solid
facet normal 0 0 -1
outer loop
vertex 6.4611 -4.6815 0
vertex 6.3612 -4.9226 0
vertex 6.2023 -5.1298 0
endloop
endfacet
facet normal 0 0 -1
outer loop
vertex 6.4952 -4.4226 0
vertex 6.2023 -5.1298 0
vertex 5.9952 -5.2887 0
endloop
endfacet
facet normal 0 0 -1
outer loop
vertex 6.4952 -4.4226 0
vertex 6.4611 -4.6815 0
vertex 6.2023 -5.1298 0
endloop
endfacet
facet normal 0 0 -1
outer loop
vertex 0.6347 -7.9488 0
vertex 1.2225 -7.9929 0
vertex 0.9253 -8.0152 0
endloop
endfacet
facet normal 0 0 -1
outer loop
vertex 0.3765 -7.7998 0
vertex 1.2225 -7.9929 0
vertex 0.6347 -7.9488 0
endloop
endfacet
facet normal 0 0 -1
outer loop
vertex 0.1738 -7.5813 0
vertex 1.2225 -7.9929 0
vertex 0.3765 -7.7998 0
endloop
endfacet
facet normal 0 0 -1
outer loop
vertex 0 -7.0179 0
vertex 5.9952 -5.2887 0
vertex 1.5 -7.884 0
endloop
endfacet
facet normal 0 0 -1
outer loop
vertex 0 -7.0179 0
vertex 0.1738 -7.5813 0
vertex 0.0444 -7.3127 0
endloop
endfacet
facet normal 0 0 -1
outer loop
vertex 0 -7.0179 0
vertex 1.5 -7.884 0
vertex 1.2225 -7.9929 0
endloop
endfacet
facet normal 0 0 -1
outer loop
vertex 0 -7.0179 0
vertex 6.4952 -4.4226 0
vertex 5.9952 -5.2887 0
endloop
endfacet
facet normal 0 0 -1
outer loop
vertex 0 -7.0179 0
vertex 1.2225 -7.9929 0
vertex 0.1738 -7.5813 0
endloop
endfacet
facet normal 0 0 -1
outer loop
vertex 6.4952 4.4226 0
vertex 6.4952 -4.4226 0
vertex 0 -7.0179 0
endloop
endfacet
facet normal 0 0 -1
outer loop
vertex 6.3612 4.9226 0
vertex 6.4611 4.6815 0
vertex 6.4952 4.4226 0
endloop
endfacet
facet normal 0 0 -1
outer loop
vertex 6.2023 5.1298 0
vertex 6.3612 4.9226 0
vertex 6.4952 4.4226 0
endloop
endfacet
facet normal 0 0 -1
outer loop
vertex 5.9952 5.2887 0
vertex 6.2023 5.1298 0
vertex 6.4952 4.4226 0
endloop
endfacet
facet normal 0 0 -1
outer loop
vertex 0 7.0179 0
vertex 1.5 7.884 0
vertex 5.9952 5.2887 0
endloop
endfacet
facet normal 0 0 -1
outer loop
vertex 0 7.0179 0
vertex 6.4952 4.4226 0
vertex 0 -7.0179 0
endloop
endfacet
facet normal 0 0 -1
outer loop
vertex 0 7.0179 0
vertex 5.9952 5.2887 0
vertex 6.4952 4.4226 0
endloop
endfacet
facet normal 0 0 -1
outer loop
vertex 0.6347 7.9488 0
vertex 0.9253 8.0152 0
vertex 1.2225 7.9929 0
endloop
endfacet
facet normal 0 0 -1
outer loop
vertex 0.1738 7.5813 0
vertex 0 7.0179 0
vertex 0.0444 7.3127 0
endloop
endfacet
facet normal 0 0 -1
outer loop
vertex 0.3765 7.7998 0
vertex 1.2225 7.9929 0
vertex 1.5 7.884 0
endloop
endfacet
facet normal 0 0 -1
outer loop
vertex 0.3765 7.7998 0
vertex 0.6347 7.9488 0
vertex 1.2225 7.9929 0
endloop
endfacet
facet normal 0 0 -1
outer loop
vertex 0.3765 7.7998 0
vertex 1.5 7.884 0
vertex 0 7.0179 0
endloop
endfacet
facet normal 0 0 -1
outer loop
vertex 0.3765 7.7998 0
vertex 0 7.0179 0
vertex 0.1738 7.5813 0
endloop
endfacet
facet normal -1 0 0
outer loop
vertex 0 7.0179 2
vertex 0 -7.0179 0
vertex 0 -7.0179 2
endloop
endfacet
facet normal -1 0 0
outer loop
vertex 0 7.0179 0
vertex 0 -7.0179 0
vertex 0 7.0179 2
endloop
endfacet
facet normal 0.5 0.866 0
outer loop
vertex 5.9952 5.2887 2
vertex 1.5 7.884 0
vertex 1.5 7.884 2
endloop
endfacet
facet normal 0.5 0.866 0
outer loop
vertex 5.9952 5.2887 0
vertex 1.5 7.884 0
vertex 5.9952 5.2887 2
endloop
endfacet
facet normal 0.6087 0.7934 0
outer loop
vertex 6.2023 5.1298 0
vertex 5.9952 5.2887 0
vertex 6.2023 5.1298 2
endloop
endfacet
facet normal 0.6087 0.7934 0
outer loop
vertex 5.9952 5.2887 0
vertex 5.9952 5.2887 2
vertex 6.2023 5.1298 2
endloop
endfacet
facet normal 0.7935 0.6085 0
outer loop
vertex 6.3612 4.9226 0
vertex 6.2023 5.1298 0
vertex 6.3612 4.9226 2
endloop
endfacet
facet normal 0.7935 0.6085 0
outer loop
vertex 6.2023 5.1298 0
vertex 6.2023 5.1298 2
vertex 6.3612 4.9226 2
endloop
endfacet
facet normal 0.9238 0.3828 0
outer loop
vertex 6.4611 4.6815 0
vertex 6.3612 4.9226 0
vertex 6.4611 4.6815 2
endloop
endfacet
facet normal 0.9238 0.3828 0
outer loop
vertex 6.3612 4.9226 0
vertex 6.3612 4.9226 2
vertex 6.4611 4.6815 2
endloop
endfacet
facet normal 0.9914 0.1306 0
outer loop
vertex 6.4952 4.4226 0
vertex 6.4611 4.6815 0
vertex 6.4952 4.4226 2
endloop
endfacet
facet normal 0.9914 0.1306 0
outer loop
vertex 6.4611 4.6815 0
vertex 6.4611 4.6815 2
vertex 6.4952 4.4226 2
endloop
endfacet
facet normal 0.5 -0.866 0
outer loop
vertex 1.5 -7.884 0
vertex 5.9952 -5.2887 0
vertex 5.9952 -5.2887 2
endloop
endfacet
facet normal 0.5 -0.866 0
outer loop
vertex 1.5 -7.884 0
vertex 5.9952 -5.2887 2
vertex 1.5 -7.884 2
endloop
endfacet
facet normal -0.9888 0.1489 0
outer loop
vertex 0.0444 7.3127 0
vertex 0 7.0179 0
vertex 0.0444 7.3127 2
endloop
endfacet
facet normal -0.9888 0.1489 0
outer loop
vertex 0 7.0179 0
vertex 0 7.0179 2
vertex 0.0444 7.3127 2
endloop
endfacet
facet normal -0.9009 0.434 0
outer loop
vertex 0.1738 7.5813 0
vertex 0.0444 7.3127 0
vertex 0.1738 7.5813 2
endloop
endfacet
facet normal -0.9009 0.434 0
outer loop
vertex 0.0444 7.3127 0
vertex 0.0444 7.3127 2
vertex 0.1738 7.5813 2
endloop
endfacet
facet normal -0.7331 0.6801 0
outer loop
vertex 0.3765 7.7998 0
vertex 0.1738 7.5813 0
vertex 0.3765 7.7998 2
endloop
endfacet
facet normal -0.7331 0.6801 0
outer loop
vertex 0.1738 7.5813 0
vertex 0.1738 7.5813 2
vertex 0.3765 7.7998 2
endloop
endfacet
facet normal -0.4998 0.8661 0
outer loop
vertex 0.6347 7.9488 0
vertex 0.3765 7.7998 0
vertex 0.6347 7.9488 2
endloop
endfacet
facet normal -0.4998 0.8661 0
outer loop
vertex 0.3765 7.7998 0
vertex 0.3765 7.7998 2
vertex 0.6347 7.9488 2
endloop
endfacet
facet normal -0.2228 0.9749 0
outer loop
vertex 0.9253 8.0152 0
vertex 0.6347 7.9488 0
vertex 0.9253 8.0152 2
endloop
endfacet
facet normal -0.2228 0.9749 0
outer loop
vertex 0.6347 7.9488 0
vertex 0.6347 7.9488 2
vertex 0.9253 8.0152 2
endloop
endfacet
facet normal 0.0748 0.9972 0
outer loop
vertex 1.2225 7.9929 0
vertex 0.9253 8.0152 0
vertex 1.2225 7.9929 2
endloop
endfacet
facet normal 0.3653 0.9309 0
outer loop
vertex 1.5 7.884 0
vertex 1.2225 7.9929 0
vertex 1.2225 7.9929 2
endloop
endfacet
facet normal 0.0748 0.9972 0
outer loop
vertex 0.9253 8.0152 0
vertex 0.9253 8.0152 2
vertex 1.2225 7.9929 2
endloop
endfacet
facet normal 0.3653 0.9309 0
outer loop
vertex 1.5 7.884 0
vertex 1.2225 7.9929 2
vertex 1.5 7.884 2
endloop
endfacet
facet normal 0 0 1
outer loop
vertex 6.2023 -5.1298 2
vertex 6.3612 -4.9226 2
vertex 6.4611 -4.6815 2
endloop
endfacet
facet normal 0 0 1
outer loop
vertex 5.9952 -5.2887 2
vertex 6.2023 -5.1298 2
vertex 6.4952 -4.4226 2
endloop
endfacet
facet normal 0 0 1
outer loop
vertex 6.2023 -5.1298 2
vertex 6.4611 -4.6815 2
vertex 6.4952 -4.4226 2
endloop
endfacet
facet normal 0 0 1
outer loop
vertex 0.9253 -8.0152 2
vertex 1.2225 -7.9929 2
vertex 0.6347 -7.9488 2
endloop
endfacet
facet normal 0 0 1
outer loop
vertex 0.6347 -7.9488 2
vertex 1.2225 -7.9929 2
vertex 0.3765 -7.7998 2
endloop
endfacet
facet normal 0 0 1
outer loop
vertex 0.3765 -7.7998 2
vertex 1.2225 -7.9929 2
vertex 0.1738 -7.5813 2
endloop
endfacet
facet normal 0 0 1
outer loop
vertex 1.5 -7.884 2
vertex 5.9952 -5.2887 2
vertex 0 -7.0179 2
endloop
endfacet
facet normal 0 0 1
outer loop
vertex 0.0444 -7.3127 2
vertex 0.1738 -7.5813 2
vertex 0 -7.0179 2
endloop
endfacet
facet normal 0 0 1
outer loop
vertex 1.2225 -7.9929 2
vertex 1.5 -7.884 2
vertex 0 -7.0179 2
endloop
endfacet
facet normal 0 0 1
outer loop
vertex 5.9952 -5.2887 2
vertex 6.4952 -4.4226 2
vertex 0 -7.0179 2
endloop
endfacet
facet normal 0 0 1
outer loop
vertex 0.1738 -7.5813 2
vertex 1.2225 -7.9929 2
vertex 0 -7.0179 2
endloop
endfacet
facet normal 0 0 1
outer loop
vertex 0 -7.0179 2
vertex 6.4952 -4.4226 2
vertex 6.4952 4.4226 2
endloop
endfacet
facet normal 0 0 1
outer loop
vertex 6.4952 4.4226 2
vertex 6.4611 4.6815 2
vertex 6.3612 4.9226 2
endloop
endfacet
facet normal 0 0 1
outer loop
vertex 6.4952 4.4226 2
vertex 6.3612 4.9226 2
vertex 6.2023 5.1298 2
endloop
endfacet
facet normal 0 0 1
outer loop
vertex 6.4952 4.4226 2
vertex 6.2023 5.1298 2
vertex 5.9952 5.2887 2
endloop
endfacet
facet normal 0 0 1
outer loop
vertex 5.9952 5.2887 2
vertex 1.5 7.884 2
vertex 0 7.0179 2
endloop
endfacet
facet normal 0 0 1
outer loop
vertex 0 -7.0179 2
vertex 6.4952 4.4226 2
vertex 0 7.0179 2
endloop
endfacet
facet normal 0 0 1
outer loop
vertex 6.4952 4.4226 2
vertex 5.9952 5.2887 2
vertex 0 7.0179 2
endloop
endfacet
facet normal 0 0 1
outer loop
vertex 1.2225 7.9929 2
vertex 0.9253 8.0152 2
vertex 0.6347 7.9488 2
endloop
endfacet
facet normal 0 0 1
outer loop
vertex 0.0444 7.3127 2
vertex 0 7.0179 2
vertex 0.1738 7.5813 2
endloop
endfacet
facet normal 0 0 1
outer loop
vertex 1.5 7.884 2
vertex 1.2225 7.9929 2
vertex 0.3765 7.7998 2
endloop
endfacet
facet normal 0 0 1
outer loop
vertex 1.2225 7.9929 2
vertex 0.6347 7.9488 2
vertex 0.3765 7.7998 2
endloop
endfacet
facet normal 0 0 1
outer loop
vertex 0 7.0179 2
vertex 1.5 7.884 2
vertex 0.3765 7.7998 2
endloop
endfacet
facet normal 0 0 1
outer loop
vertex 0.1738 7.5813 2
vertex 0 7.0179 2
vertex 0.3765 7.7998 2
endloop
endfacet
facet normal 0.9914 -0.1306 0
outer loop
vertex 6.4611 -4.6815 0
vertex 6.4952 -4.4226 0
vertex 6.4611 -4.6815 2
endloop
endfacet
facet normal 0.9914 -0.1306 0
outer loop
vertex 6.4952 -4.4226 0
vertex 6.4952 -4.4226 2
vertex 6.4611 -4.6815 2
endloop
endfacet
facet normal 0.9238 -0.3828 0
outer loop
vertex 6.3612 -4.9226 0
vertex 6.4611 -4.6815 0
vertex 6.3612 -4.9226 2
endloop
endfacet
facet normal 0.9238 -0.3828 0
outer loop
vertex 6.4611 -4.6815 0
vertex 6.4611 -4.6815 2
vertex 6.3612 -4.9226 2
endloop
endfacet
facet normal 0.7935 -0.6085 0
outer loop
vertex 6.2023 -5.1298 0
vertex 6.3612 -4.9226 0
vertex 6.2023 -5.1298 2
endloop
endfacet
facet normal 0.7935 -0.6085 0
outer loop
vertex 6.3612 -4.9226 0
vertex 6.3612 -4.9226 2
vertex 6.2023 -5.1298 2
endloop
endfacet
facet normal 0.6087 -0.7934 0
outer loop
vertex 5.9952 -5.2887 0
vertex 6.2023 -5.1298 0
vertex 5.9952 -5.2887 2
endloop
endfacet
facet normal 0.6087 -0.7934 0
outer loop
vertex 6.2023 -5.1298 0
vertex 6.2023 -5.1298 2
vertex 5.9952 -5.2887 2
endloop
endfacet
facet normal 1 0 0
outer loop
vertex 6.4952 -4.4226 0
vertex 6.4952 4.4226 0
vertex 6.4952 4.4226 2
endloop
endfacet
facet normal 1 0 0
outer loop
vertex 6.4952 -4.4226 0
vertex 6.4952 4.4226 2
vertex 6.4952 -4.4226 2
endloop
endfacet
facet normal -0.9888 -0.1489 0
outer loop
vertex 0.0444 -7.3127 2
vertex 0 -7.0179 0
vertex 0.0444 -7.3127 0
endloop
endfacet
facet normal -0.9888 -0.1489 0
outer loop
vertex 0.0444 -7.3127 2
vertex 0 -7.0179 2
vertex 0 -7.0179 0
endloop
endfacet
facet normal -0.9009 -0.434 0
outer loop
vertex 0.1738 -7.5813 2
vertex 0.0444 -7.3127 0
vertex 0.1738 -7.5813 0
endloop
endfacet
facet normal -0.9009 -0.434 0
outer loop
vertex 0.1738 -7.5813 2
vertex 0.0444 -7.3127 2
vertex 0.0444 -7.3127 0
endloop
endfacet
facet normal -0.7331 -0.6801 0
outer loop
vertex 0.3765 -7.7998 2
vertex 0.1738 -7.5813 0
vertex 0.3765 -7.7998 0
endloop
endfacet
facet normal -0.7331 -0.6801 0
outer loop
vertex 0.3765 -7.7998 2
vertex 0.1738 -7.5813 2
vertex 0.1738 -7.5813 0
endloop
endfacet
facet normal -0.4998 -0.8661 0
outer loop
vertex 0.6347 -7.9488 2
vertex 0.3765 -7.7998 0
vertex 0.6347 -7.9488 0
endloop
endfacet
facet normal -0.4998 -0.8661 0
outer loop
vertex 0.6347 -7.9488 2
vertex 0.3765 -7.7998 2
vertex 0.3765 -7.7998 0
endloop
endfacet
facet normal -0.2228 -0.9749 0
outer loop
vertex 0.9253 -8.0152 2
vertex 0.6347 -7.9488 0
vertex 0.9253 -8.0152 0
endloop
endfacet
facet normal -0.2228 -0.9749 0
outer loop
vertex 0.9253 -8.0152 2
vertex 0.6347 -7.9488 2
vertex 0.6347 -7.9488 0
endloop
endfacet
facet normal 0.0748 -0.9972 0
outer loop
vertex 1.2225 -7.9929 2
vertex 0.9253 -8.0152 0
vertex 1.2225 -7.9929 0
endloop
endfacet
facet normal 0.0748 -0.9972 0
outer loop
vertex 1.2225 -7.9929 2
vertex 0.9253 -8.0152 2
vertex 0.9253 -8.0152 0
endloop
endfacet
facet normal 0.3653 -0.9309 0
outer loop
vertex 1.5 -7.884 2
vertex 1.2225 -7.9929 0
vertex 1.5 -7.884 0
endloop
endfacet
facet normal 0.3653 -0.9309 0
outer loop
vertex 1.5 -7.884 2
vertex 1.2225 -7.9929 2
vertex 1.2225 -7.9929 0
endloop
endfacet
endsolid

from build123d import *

# Parameters (mm, degrees)
Y_KSEKLIK_EKSTR_ZYON1_DEPTH = 2
RADYUS1_R                   = 1


with BuildPart() as part:
    # Çizim1 → Yükseklik-Ekstrüzyon1 (new body)
    with BuildSketch(Plane.XY):
        Polygon((0, -8.75), (0, 8.75), (6.495190528, 5), (6.495190528, -5), align=None)
    extrude(amount=Y_KSEKLIK_EKSTR_ZYON1_DEPTH)

    # Radyus1
    radyus1_edges = [part.edges().sort_by_distance(p)[0] for p in [
        (0, -8.75, 1),
        (0, 8.75, 1),
        (6.495190528, 5, 1),
        (6.495190528, -5, 1),
    ]]
    fillet(radyus1_edges, radius=RADYUS1_R)


solid = part.part
